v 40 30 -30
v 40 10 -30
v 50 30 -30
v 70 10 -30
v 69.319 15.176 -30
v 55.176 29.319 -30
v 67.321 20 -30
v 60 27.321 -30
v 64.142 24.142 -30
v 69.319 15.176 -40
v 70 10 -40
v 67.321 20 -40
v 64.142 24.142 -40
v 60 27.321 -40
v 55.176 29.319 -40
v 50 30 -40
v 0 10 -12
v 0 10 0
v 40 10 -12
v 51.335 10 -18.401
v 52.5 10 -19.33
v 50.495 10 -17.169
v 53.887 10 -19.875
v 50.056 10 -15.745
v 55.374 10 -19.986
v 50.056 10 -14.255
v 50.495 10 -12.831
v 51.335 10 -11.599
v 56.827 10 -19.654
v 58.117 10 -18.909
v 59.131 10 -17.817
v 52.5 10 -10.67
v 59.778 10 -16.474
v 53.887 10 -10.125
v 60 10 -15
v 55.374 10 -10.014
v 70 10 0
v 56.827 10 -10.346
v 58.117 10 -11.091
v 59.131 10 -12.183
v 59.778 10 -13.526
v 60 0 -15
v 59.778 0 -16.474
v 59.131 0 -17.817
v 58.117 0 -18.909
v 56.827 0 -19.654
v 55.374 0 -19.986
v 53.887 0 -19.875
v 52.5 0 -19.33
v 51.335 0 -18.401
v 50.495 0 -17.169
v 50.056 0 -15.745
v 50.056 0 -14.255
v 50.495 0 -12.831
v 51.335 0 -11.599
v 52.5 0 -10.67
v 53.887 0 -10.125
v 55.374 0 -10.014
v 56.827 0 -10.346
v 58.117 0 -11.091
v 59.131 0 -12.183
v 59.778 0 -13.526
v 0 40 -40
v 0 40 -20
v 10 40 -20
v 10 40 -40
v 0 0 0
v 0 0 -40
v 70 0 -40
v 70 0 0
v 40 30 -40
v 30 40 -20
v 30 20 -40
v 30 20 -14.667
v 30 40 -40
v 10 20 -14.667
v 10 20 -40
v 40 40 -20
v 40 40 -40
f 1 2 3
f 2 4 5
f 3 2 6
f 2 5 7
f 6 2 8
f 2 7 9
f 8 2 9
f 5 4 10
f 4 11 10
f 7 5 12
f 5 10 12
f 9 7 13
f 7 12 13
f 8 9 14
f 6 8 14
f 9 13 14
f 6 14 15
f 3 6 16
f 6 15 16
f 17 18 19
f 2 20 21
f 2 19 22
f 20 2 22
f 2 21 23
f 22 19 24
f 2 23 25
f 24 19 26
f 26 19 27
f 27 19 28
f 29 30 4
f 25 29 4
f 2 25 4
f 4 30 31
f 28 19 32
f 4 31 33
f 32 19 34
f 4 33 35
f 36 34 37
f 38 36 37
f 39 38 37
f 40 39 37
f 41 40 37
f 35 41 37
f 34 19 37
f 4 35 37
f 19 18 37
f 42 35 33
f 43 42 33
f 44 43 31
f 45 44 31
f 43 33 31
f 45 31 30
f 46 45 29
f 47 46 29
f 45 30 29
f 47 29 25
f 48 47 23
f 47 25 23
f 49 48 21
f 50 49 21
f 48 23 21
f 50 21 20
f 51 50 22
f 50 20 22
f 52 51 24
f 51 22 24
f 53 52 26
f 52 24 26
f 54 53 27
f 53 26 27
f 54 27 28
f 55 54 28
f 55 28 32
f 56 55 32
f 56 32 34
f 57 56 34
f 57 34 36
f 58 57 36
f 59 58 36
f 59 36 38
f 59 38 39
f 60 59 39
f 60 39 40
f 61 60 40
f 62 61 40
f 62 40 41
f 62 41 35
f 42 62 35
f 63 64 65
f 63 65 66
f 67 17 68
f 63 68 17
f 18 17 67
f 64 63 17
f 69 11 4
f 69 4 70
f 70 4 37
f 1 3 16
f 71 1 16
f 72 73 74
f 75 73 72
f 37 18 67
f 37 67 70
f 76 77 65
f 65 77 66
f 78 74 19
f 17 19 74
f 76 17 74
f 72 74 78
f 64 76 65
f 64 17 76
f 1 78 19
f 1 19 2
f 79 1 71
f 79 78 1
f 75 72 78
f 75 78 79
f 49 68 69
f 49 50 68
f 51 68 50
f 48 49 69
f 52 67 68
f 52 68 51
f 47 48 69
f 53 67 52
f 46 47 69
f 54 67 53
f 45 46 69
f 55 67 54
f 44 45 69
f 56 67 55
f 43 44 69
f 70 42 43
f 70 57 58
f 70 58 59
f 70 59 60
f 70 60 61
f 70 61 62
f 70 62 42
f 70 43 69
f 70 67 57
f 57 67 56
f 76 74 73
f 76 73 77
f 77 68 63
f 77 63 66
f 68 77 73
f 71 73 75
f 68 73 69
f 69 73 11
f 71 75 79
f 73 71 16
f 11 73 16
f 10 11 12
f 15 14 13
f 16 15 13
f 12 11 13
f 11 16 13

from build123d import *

# Parameters (mm, degrees)
BOSS_EXTRUDE1_DEPTH            = 40
SKETCH2_W                      = 40
SKETCH2_H                      = 30
BOSS_EXTRUDE2_DEPTH            = 20
BOSS_EXTRUDE3_DEPTH            = 30
CUT_EXTRUDE1_DEPTH             = 30
SKETCH5_W                      = 70
SKETCH5_H                      = 40
BOSS_EXTRUDE4_DEPTH            = 10
SKETCH6_W                      = 20
SKETCH6_H                      = 20
CUT_EXTRUDE2_DEPTH             = 41
F_10_0_10_DIAMETER_HOLE1_D     = 10
F_10_0_10_DIAMETER_HOLE1_DEPTH = 40
FILLET1_R                      = 20


with BuildPart() as part:
    # Sketch1 → Boss-Extrude1 (new body)
    with BuildSketch(Plane(origin=(0, 0, 0), x_dir=(0, -1, 0), z_dir=(-1, 0, 0))):
        Polygon((-10, -12), (-40, -20), (-10, -20), align=None)
    extrude(amount=-BOSS_EXTRUDE1_DEPTH)

    # Sketch2 → Boss-Extrude2 (add)
    with BuildSketch(Plane(origin=(0, 0, -20), x_dir=(-1, 0, 0), z_dir=(0, 0, -1))):
        with Locations((-20, 25)):
            Rectangle(SKETCH2_W, SKETCH2_H)
    extrude(amount=BOSS_EXTRUDE2_DEPTH)

    # Sketch3 → Boss-Extrude3 (add)
    with BuildSketch(Plane(origin=(40, 0, 0), x_dir=(0, 0, -1), z_dir=(1, 0, 0))):
        Polygon((40, 10), (0, 10), (20, 40), (40, 40), align=None)
    extrude(amount=BOSS_EXTRUDE3_DEPTH)

    # Sketch4 → Cut-Extrude1 (cut)
    with BuildSketch(Plane(origin=(70, 0, 0), x_dir=(0, 0, -1), z_dir=(1, 0, 0))):
        Polygon((20, 40), (0, 10), (30, 10), (30, 30), (40, 30), (40, 40), align=None)
    extrude(amount=-CUT_EXTRUDE1_DEPTH, mode=Mode.SUBTRACT)

    # Sketch5 → Boss-Extrude4 (add)
    with BuildSketch(Plane.XZ.offset(-10)):
        with Locations((35, -20)):
            Rectangle(SKETCH5_W, SKETCH5_H)
    extrude(amount=BOSS_EXTRUDE4_DEPTH)

    # Sketch6 → Cut-Extrude2 (cut, through all)
    with BuildSketch(Plane(origin=(0, 0, -40), x_dir=(-1, 0, 0), z_dir=(0, 0, -1))):
        with Locations((-20, 30)):
            Rectangle(SKETCH6_W, SKETCH6_H)
    extrude(amount=-CUT_EXTRUDE2_DEPTH, mode=Mode.SUBTRACT)

    # Ø10.0 (10) Diameter Hole1
    with Locations(Plane(origin=(0, 0, 0), x_dir=(-1, 0, 0), z_dir=(0, -1, 0))):
        with Locations((-55, 15)):
            Hole(F_10_0_10_DIAMETER_HOLE1_D / 2, depth=F_10_0_10_DIAMETER_HOLE1_DEPTH)

    # Fillet1
    fillet1_edges = [part.edges().sort_by_distance(p)[0] for p in [
        (70, 30, -35),
    ]]
    fillet(fillet1_edges, radius=FILLET1_R)


solid = part.part
